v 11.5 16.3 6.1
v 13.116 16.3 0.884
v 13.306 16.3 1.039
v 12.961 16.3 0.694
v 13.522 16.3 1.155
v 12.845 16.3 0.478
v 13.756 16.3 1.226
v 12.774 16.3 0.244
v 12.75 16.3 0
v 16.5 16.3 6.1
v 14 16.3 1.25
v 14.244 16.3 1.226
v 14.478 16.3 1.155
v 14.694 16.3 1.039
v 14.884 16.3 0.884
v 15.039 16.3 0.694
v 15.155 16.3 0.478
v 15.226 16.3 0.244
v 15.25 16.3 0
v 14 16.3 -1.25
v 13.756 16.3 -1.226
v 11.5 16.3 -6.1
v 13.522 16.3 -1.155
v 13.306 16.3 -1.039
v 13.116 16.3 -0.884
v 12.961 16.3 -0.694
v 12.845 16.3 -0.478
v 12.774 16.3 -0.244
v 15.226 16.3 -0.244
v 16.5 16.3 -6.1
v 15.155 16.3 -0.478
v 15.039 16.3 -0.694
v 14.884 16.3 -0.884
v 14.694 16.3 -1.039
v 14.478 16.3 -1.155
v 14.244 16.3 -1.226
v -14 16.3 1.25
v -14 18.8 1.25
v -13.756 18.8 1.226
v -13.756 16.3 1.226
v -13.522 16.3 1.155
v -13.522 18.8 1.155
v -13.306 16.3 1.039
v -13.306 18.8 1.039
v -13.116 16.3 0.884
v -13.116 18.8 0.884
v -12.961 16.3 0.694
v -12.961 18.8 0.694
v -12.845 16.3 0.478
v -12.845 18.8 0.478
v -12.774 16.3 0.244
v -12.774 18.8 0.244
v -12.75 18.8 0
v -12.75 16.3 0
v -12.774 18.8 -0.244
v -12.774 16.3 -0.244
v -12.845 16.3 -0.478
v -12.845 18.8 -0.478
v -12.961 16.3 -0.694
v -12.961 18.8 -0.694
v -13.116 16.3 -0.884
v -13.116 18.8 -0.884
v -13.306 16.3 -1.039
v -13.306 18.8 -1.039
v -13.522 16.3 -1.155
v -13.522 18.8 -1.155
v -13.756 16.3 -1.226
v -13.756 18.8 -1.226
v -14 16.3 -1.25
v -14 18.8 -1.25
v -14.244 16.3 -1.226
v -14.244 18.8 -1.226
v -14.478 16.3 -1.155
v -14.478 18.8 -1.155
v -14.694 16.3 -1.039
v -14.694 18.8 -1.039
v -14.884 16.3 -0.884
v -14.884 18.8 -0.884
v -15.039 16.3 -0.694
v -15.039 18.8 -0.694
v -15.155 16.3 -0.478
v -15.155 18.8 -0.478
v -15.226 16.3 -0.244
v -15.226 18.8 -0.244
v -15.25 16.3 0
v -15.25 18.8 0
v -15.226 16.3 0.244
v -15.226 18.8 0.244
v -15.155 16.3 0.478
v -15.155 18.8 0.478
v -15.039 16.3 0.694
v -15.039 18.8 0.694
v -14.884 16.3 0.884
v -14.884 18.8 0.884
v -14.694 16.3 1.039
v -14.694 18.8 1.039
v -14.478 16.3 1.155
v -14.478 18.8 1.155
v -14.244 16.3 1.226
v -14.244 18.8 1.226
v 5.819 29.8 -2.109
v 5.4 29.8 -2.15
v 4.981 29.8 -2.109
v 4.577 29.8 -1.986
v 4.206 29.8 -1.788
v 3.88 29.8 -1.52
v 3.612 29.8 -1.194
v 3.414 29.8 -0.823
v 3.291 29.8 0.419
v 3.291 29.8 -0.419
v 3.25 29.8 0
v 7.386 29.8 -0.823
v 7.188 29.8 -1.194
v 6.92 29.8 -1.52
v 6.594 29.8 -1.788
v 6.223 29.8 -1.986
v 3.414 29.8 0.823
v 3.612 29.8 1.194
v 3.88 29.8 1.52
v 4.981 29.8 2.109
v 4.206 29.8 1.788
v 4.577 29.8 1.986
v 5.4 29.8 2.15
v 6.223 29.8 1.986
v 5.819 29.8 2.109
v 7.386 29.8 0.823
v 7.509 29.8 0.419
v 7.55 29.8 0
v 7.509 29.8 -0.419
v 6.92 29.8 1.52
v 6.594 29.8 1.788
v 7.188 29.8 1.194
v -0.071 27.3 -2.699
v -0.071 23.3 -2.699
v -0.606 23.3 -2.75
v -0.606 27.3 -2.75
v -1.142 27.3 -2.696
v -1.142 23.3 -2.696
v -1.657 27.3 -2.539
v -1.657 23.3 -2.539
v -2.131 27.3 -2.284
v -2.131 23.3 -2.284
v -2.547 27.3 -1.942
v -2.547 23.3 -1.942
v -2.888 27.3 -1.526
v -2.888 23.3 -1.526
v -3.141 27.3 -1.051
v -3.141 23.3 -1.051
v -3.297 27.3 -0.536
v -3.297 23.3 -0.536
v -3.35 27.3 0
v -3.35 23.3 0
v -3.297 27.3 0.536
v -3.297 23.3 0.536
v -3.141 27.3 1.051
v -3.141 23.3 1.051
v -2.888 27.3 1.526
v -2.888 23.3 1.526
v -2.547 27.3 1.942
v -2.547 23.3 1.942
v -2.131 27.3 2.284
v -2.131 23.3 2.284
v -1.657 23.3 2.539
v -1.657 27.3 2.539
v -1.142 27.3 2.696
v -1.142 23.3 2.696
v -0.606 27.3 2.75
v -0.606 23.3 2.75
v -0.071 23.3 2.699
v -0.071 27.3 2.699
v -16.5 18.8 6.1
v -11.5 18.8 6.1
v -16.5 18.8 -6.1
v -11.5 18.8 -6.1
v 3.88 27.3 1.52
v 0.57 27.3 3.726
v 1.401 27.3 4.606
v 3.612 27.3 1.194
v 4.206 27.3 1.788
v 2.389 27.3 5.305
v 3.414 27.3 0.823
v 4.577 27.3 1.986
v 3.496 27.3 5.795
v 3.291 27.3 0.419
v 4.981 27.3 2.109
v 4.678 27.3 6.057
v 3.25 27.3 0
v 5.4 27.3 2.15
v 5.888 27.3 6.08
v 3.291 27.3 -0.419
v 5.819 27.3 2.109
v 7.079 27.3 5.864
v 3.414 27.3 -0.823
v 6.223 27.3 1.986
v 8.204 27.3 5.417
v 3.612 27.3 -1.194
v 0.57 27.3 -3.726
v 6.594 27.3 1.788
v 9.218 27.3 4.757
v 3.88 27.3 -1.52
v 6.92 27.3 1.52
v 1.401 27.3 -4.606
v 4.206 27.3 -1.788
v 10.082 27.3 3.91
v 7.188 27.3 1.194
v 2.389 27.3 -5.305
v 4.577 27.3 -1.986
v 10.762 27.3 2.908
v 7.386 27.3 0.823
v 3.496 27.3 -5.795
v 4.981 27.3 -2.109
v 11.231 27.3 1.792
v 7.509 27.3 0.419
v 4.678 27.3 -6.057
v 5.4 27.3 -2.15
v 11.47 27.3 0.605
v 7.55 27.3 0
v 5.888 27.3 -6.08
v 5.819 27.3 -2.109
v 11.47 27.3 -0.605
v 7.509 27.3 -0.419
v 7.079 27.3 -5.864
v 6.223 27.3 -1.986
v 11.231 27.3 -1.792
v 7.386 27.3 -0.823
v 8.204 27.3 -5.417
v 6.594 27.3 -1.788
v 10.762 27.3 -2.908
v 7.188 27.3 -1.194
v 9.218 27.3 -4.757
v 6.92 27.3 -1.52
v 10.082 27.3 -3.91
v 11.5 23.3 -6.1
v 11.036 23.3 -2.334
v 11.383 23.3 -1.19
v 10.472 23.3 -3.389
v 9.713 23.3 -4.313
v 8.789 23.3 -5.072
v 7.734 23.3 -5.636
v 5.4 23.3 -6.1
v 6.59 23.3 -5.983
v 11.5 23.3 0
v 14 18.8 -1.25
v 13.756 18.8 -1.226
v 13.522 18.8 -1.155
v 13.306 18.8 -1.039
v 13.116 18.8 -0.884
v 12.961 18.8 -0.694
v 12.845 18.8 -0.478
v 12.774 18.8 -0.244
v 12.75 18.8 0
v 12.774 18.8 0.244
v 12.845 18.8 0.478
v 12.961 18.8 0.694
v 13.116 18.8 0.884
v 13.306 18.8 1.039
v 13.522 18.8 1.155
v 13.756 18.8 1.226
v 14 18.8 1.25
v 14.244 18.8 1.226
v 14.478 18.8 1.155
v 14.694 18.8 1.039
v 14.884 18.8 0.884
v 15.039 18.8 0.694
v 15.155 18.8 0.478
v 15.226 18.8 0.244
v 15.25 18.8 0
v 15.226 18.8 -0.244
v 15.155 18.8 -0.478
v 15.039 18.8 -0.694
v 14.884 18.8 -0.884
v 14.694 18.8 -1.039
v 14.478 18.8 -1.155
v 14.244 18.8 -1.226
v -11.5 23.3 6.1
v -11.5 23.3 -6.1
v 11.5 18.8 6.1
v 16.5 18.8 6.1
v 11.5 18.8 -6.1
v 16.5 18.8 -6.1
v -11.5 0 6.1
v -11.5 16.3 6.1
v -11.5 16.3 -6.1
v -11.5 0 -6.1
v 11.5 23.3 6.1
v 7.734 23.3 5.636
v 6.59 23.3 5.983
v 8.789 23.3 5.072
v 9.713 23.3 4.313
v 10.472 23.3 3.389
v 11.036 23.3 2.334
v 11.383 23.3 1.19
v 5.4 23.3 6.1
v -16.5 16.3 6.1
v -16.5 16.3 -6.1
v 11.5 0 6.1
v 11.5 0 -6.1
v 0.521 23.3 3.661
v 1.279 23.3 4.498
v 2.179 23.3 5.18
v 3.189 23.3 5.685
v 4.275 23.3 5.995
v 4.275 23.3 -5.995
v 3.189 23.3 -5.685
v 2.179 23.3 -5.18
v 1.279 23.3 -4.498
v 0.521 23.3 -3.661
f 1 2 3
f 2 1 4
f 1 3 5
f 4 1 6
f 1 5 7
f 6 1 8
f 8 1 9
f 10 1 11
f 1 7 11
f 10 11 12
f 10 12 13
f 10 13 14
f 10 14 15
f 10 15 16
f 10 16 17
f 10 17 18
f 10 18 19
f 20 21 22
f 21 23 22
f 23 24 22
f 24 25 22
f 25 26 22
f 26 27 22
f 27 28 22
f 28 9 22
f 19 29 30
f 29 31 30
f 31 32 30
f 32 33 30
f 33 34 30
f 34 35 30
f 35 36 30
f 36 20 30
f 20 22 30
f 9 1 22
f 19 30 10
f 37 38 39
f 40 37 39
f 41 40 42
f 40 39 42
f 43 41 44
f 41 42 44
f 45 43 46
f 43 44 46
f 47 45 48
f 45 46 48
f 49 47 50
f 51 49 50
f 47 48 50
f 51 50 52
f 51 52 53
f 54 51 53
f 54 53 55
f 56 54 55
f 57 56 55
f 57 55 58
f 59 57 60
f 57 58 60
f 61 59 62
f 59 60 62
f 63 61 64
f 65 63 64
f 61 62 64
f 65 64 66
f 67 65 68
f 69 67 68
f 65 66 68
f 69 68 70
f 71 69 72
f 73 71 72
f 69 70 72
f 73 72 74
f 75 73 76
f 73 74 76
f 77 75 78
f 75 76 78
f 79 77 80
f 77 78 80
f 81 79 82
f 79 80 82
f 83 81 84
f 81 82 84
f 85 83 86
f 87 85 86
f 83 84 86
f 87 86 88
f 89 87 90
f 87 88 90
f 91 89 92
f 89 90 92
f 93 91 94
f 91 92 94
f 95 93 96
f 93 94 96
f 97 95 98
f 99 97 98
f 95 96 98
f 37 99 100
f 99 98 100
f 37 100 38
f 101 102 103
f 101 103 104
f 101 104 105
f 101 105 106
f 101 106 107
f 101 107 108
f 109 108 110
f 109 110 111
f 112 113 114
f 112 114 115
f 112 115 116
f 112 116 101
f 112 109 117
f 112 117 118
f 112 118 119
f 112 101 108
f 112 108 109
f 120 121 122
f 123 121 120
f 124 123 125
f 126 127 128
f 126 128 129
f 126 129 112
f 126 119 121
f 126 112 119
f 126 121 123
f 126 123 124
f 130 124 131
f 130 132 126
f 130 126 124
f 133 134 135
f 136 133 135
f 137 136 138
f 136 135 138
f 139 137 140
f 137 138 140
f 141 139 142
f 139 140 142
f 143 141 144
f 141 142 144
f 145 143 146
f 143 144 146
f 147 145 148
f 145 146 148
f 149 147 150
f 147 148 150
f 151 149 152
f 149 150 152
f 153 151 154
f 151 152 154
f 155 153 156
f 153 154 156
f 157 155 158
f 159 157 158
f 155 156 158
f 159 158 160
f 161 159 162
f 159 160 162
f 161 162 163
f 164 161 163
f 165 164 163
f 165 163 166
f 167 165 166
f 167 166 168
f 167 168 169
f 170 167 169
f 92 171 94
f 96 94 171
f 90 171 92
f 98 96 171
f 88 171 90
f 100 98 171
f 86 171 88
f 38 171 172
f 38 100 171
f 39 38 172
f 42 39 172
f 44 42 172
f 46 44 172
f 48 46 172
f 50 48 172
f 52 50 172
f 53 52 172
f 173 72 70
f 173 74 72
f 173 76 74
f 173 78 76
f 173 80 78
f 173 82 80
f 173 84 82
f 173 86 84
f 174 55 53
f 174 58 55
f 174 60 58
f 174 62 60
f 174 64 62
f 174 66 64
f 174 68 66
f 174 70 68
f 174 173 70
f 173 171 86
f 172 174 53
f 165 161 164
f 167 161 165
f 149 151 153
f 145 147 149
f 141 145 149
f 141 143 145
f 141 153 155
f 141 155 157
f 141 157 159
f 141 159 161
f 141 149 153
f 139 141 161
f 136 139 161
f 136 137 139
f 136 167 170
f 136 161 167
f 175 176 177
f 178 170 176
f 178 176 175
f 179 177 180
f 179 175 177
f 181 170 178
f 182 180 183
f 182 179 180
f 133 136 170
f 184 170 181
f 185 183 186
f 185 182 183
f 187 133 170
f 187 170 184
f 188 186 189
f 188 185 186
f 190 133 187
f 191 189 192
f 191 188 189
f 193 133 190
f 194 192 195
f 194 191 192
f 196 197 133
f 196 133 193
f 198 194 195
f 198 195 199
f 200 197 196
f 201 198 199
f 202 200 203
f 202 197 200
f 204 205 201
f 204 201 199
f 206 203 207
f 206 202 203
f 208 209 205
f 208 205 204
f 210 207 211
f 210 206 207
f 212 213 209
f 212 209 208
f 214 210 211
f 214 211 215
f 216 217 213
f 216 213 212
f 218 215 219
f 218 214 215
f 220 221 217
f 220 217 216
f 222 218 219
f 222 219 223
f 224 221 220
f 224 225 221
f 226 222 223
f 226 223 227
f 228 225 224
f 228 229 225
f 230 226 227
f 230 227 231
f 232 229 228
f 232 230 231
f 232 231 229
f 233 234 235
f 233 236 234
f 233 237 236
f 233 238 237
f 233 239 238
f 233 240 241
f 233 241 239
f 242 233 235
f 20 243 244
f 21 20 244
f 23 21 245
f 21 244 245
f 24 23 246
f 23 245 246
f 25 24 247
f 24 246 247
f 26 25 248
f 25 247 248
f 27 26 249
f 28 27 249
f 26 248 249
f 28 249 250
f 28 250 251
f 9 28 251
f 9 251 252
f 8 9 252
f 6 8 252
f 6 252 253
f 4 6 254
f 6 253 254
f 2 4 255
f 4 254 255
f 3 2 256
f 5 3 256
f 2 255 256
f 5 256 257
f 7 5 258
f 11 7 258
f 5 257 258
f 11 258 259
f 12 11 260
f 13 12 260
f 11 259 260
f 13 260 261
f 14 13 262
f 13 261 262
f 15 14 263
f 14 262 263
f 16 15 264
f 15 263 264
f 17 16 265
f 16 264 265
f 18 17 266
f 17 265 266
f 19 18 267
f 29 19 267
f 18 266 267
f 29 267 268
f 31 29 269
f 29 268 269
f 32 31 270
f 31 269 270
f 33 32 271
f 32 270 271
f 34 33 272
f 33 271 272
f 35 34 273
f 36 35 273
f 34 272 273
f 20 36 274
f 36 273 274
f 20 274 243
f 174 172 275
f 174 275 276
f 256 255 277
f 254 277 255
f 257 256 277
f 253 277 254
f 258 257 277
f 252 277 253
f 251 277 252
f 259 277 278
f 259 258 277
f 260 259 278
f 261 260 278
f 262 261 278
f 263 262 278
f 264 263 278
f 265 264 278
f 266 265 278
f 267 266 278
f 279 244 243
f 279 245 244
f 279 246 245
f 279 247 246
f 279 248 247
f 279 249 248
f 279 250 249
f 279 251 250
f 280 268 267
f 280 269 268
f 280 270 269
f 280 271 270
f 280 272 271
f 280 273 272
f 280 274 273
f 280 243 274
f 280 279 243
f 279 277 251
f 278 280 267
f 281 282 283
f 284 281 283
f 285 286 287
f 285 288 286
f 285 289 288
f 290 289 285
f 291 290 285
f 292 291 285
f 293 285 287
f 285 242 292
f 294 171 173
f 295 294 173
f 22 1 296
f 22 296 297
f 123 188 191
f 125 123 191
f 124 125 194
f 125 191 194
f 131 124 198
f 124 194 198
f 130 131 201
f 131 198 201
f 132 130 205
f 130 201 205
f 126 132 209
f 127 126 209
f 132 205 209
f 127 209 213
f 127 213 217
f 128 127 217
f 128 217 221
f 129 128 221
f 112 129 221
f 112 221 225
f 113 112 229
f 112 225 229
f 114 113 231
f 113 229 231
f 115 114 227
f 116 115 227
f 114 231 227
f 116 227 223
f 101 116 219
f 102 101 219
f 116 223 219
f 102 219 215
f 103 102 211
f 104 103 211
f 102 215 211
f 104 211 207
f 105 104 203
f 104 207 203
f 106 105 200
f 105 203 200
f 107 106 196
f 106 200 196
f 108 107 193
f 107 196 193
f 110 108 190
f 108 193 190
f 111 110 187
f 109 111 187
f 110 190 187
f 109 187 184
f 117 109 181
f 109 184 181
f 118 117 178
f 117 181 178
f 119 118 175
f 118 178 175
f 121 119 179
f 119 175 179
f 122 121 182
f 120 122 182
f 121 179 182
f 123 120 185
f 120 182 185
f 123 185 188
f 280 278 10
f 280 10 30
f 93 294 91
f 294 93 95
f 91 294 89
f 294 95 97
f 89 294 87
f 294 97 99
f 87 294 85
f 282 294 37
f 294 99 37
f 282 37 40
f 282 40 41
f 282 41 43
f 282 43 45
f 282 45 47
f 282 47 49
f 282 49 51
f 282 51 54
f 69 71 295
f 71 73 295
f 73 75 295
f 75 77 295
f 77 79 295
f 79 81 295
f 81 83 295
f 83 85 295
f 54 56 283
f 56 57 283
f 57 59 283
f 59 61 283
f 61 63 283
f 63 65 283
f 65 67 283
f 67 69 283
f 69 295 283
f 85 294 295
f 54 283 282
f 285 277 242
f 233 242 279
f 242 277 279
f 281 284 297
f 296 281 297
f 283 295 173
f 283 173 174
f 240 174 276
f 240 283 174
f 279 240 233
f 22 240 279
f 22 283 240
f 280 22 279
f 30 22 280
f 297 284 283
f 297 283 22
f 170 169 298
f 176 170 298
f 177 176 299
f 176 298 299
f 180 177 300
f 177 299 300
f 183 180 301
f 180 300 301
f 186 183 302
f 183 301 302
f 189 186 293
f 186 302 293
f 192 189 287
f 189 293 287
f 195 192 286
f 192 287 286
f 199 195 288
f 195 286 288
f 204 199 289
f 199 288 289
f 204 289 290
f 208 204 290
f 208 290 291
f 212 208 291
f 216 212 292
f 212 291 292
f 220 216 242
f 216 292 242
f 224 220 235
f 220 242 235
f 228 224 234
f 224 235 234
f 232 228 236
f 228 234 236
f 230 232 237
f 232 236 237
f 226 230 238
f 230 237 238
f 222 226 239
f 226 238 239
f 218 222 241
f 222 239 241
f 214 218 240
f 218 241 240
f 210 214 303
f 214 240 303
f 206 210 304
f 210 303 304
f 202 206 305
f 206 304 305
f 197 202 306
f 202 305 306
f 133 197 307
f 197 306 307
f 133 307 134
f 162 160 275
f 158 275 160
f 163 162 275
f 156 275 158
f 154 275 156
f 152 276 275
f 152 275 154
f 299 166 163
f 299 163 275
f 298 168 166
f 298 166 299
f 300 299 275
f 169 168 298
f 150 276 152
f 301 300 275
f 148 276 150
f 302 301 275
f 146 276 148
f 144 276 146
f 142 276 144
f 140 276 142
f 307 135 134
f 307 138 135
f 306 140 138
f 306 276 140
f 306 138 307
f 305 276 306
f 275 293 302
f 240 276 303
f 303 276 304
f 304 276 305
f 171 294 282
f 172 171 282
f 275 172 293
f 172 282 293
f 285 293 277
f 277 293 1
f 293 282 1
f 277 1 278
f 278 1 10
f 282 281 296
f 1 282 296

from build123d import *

# Parameters (mm, degrees)
SKETCH1_W           = 23
SKETCH1_H           = 12.2
BOSS_EXTRUDE1_DEPTH = 23.3
BOSS_EXTRUDE2_START = -4.5
SKETCH2_W           = 5
SKETCH2_H           = 12.2
SKETCH2_R           = 1.25
BOSS_EXTRUDE2_DEPTH = 2.5
SKETCH3_R           = 2.15
BOSS_EXTRUDE3_DEPTH = 4
BOSS_EXTRUDE4_START = 4
SKETCH3_4_R         = 2.15
BOSS_EXTRUDE4_DEPTH = 2.5


with BuildPart() as part:
    # Sketch1 → Boss-Extrude1 (new body)
    with BuildSketch(Plane(origin=(0, 0, 0), x_dir=(1, 0, 0), z_dir=(0, 1, 0))):
        Rectangle(SKETCH1_W, SKETCH1_H)
    extrude(amount=BOSS_EXTRUDE1_DEPTH)

    # Sketch2 → Boss-Extrude2 (add)
    # profile 1 of 2: a face of its own
    with BuildSketch(Plane(origin=(0, 23.3, 0), x_dir=(1, 0, 0), z_dir=(0, 1, 0)).offset(BOSS_EXTRUDE2_START)):
        with Locations((-14, 0)):
            Rectangle(SKETCH2_W, SKETCH2_H)
        with Locations(Location((-14, 0, 0), (0, 0, 270))):
            Circle(SKETCH2_R, mode=Mode.SUBTRACT)
    # profile 2 of 2: a face of its own
    with BuildSketch(Plane(origin=(0, 23.3, 0), x_dir=(1, 0, 0), z_dir=(0, 1, 0)).offset(BOSS_EXTRUDE2_START)):
        with Locations((14, 0)):
            Rectangle(SKETCH2_W, SKETCH2_H)
        with Locations(Location((14, 0, 0), (0, 0, 90))):
            Circle(SKETCH2_R, mode=Mode.SUBTRACT)
    extrude(amount=-BOSS_EXTRUDE2_DEPTH)

    # Sketch3 → Boss-Extrude3 (add)
    # profile 1 of 2: a face of its own
    with BuildSketch(Plane(origin=(0, 23.3, 0), x_dir=(1, 0, 0), z_dir=(0, 1, 0))):
        with BuildLine():
            ThreePointArc((-0.070625, -2.698566677), (11.5, 0), (-0.070625, 2.698566677))
            ThreePointArc((-0.070625, 2.698566677), (-3.35, 0), (-0.070625, -2.698566677))
        make_face()
        with Locations((5.4, 0)):
            Circle(SKETCH3_R, mode=Mode.SUBTRACT)
    # profile 2 of 2: a face of its own
    with BuildSketch(Plane(origin=(0, 23.3, 0), x_dir=(1, 0, 0), z_dir=(0, 1, 0))):
        with Locations((5.4, 0)):
            Circle(SKETCH3_R)
    extrude(amount=BOSS_EXTRUDE3_DEPTH)

    # Sketch3<4> → Boss-Extrude4 (add)
    with BuildSketch(Plane(origin=(0, 23.3, 0), x_dir=(1, 0, 0), z_dir=(0, 1, 0)).offset(BOSS_EXTRUDE4_START)):
        with Locations(Location((5.4, 0, 0), (0, 0, 270))):
            Circle(SKETCH3_4_R)
    extrude(amount=BOSS_EXTRUDE4_DEPTH)


solid = part.part
